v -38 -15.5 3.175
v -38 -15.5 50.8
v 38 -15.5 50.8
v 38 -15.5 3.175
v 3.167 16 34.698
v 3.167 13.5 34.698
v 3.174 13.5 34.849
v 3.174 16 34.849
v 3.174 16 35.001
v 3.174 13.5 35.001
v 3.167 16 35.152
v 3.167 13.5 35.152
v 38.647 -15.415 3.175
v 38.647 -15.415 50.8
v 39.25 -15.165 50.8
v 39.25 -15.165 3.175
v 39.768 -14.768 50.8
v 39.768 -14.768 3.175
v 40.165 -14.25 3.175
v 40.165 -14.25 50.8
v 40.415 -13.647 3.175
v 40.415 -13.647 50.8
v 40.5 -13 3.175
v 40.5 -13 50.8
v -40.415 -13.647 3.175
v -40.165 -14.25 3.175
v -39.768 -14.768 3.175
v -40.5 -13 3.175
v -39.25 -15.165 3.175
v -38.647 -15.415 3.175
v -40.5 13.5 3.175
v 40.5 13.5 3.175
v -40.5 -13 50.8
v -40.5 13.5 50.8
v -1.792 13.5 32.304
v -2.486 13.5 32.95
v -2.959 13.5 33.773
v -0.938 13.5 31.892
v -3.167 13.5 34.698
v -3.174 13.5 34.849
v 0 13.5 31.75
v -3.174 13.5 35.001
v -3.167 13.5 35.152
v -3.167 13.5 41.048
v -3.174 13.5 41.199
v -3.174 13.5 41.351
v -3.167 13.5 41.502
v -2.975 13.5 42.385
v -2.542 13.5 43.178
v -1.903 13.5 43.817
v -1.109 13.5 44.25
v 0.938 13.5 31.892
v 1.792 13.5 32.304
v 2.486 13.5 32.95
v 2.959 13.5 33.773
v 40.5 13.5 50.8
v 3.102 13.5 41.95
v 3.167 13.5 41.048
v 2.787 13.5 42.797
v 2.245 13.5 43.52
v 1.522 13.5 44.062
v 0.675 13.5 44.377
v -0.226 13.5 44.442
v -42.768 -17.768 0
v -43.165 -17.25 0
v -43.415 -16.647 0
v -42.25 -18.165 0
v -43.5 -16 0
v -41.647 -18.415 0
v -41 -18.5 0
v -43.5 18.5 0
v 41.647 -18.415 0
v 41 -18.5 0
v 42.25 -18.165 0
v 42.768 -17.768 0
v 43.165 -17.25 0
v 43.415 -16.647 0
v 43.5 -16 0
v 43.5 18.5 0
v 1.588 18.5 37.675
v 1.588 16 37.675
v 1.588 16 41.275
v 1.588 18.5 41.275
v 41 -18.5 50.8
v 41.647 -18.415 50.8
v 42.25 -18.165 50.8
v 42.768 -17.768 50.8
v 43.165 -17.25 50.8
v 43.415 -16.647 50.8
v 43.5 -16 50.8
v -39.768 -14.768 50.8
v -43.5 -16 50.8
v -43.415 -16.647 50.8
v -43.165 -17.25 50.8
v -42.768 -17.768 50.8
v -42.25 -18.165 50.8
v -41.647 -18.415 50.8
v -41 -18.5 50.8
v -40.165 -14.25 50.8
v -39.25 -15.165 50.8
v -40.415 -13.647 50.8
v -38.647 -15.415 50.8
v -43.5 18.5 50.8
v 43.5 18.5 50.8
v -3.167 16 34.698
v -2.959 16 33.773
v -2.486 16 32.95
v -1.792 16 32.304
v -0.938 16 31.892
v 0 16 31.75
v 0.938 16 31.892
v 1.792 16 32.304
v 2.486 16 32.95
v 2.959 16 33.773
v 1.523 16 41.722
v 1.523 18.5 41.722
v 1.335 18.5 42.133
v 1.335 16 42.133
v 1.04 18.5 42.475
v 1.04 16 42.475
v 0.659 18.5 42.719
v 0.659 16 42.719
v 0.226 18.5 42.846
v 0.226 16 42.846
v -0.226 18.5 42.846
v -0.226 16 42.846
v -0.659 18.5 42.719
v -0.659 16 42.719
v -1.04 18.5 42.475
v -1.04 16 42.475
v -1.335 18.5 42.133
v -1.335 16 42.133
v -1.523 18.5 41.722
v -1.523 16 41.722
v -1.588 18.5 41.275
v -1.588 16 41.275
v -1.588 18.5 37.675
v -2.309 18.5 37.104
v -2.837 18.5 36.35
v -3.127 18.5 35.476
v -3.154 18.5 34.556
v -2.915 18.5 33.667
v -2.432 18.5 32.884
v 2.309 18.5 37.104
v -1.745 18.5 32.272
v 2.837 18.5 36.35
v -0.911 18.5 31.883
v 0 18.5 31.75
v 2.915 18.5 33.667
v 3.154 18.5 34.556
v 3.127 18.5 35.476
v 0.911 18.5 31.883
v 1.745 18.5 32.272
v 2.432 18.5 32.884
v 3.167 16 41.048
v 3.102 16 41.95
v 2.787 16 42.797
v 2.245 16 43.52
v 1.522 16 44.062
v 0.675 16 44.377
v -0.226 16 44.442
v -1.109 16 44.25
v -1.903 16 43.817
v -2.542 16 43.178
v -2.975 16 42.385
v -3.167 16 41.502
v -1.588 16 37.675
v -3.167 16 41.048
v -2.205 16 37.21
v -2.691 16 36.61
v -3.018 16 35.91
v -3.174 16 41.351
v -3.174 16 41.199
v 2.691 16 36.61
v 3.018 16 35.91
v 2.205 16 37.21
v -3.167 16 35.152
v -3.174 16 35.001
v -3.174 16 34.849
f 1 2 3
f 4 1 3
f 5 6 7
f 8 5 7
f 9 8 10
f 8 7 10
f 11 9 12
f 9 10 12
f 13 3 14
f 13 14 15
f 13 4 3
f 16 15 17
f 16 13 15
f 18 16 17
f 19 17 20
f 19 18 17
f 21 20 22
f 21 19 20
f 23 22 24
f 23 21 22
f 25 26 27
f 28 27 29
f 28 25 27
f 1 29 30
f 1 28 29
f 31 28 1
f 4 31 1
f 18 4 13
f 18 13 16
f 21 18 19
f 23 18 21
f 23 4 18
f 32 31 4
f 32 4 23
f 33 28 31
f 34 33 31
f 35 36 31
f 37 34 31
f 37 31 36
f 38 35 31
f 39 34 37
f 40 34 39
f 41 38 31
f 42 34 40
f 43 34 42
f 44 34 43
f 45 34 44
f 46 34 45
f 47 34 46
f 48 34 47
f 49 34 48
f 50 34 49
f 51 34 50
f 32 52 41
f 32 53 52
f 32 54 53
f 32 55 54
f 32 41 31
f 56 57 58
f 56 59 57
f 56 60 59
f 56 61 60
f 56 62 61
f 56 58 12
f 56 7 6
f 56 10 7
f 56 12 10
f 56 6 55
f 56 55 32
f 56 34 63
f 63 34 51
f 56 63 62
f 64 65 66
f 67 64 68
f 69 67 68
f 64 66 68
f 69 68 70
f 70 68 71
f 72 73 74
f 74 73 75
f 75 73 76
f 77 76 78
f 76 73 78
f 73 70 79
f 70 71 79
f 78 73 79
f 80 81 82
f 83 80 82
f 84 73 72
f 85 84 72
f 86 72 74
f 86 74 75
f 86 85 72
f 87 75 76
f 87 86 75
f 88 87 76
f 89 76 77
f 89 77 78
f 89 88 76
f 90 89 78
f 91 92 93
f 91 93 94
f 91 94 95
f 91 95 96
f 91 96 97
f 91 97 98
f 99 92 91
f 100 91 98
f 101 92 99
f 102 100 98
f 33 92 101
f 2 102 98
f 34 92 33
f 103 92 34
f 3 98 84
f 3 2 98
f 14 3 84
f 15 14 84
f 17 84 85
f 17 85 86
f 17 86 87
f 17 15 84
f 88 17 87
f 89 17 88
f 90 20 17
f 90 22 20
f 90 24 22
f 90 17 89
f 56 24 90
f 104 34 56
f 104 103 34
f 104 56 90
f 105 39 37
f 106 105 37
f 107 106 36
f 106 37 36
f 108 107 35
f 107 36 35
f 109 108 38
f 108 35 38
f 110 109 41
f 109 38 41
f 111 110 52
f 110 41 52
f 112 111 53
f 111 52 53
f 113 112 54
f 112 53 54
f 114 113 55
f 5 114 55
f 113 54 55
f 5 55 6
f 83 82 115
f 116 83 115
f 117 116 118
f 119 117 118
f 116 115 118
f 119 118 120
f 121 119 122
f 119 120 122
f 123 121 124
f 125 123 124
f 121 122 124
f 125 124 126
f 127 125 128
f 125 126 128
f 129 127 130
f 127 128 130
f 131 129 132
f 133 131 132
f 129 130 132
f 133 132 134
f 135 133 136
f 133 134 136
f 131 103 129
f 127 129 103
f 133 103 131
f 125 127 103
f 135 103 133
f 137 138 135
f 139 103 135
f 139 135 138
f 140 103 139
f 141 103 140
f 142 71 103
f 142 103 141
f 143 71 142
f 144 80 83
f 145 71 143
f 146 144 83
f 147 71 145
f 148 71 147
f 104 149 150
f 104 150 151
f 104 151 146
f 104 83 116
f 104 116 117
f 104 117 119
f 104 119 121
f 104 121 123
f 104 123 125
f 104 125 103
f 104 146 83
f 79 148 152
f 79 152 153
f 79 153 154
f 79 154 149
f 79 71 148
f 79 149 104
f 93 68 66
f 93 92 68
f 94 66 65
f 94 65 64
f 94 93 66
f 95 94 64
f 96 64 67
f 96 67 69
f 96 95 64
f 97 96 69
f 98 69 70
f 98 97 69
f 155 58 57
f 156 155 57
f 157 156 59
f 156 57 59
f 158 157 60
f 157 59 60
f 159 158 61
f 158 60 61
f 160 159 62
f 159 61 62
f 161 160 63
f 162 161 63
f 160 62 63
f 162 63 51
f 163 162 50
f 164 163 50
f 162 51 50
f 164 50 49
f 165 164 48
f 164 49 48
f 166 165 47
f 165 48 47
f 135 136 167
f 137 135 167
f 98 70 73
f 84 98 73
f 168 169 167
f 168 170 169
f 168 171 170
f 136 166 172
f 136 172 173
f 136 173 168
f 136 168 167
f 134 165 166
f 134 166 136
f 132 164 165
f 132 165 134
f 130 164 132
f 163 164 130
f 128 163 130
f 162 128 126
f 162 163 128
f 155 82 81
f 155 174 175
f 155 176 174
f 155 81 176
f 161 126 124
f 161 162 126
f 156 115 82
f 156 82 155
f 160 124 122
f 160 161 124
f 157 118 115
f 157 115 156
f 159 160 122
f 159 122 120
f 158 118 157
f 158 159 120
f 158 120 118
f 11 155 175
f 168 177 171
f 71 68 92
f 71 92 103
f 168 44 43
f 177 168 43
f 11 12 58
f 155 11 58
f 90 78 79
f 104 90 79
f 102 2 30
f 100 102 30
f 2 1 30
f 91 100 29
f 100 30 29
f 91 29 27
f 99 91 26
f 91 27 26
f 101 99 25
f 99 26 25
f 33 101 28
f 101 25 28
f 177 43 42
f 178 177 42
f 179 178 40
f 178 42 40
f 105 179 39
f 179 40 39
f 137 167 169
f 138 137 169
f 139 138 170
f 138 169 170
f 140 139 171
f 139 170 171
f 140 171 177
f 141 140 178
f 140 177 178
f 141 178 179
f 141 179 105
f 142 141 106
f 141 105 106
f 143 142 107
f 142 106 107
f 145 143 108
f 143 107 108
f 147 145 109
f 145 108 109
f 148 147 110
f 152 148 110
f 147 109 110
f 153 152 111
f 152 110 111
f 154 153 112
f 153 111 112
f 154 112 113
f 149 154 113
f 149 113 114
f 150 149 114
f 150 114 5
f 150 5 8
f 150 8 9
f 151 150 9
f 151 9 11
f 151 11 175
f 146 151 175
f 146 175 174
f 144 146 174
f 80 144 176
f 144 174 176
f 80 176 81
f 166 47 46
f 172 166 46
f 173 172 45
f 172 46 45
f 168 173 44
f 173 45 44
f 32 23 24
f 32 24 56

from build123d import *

# Parameters (mm, degrees)
F0_W     = 87
F0_H     = 37
F1_DEPTH = 50.8
F2_W     = 81
F2_H     = 29
F3_DEPTH = 47.625
F4_R     = 2.5
F6_DEPTH = 2.5
F8_DEPTH = 25.4


with BuildPart() as f1:
    # F0 (on Top) → F1 (new body)
    with BuildSketch(Plane.XY):
        Rectangle(F0_W, F0_H)
    extrude(amount=F1_DEPTH)

    # F2 (on face) → F3 (cut)
    with BuildSketch(Plane.XY.offset(50.8)):
        with Locations((0, -1)):
            Rectangle(F2_W, F2_H)
    extrude(amount=-F3_DEPTH, mode=Mode.SUBTRACT)

    # F4
    f4_edges = [f1.edges().sort_by_distance(p)[0] for p in [
        (43.5, -18.5, 25.4),
        (-43.5, -18.5, 25.4),
        (-40.5, -15.5, 26.9875),
        (40.5, -15.5, 26.9875),
    ]]
    fillet(f4_edges, radius=F4_R)

    # F5 (on face) → F6 (cut)
    with BuildSketch(Plane.XZ.offset(-13.5)):
        with BuildLine():
            Line((3.166904, 35.151597), (3.166904, 41.048403))
            ThreePointArc((3.166904, 41.048403), (0.226597, 44.441904), (-3.166904, 41.501597))
            Line((-3.166904, 41.501597), (-3.166904, 41.048403))
            Line((-3.166904, 41.048403), (-3.166904, 35.151597))
            Line((-3.166904, 35.151597), (-3.166904, 34.698403))
            ThreePointArc((-3.166904, 34.698403), (0, 31.75), (3.166904, 34.698403))
            Line((3.166904, 34.698403), (3.166904, 35.151597))
        make_face()
        with BuildLine():
            Line((-3.166904, 41.048403), (-3.166904, 41.501597))
            ThreePointArc((-3.166904, 41.501597), (-3.175, 41.275), (-3.166904, 41.048403))
        make_face()
        with BuildLine():
            ThreePointArc((3.166904, 34.698403), (3.175, 34.925), (3.166904, 35.151597))
            Line((3.166904, 35.151597), (3.166904, 34.698403))
        make_face()
        with BuildLine():
            Line((-3.166904, 34.698403), (-3.166904, 35.151597))
            ThreePointArc((-3.166904, 35.151597), (-3.175, 34.925), (-3.166904, 34.698403))
        make_face()
    extrude(amount=-F6_DEPTH, mode=Mode.SUBTRACT)

    # F7 (on Front) → F8 (cut)
    with BuildSketch(Plane.XZ):
        with BuildLine():
            Line((-1.5875, 41.275), (-1.5875, 37.674631))
            ThreePointArc((-1.5875, 37.674631), (0, 31.75), (1.5875, 37.674631))
            Line((1.5875, 37.674631), (1.5875, 41.275))
            ThreePointArc((1.5875, 41.275), (0, 42.8625), (-1.5875, 41.275))
        make_face()
    extrude(amount=-F8_DEPTH, mode=Mode.SUBTRACT)


solid = f1.part
